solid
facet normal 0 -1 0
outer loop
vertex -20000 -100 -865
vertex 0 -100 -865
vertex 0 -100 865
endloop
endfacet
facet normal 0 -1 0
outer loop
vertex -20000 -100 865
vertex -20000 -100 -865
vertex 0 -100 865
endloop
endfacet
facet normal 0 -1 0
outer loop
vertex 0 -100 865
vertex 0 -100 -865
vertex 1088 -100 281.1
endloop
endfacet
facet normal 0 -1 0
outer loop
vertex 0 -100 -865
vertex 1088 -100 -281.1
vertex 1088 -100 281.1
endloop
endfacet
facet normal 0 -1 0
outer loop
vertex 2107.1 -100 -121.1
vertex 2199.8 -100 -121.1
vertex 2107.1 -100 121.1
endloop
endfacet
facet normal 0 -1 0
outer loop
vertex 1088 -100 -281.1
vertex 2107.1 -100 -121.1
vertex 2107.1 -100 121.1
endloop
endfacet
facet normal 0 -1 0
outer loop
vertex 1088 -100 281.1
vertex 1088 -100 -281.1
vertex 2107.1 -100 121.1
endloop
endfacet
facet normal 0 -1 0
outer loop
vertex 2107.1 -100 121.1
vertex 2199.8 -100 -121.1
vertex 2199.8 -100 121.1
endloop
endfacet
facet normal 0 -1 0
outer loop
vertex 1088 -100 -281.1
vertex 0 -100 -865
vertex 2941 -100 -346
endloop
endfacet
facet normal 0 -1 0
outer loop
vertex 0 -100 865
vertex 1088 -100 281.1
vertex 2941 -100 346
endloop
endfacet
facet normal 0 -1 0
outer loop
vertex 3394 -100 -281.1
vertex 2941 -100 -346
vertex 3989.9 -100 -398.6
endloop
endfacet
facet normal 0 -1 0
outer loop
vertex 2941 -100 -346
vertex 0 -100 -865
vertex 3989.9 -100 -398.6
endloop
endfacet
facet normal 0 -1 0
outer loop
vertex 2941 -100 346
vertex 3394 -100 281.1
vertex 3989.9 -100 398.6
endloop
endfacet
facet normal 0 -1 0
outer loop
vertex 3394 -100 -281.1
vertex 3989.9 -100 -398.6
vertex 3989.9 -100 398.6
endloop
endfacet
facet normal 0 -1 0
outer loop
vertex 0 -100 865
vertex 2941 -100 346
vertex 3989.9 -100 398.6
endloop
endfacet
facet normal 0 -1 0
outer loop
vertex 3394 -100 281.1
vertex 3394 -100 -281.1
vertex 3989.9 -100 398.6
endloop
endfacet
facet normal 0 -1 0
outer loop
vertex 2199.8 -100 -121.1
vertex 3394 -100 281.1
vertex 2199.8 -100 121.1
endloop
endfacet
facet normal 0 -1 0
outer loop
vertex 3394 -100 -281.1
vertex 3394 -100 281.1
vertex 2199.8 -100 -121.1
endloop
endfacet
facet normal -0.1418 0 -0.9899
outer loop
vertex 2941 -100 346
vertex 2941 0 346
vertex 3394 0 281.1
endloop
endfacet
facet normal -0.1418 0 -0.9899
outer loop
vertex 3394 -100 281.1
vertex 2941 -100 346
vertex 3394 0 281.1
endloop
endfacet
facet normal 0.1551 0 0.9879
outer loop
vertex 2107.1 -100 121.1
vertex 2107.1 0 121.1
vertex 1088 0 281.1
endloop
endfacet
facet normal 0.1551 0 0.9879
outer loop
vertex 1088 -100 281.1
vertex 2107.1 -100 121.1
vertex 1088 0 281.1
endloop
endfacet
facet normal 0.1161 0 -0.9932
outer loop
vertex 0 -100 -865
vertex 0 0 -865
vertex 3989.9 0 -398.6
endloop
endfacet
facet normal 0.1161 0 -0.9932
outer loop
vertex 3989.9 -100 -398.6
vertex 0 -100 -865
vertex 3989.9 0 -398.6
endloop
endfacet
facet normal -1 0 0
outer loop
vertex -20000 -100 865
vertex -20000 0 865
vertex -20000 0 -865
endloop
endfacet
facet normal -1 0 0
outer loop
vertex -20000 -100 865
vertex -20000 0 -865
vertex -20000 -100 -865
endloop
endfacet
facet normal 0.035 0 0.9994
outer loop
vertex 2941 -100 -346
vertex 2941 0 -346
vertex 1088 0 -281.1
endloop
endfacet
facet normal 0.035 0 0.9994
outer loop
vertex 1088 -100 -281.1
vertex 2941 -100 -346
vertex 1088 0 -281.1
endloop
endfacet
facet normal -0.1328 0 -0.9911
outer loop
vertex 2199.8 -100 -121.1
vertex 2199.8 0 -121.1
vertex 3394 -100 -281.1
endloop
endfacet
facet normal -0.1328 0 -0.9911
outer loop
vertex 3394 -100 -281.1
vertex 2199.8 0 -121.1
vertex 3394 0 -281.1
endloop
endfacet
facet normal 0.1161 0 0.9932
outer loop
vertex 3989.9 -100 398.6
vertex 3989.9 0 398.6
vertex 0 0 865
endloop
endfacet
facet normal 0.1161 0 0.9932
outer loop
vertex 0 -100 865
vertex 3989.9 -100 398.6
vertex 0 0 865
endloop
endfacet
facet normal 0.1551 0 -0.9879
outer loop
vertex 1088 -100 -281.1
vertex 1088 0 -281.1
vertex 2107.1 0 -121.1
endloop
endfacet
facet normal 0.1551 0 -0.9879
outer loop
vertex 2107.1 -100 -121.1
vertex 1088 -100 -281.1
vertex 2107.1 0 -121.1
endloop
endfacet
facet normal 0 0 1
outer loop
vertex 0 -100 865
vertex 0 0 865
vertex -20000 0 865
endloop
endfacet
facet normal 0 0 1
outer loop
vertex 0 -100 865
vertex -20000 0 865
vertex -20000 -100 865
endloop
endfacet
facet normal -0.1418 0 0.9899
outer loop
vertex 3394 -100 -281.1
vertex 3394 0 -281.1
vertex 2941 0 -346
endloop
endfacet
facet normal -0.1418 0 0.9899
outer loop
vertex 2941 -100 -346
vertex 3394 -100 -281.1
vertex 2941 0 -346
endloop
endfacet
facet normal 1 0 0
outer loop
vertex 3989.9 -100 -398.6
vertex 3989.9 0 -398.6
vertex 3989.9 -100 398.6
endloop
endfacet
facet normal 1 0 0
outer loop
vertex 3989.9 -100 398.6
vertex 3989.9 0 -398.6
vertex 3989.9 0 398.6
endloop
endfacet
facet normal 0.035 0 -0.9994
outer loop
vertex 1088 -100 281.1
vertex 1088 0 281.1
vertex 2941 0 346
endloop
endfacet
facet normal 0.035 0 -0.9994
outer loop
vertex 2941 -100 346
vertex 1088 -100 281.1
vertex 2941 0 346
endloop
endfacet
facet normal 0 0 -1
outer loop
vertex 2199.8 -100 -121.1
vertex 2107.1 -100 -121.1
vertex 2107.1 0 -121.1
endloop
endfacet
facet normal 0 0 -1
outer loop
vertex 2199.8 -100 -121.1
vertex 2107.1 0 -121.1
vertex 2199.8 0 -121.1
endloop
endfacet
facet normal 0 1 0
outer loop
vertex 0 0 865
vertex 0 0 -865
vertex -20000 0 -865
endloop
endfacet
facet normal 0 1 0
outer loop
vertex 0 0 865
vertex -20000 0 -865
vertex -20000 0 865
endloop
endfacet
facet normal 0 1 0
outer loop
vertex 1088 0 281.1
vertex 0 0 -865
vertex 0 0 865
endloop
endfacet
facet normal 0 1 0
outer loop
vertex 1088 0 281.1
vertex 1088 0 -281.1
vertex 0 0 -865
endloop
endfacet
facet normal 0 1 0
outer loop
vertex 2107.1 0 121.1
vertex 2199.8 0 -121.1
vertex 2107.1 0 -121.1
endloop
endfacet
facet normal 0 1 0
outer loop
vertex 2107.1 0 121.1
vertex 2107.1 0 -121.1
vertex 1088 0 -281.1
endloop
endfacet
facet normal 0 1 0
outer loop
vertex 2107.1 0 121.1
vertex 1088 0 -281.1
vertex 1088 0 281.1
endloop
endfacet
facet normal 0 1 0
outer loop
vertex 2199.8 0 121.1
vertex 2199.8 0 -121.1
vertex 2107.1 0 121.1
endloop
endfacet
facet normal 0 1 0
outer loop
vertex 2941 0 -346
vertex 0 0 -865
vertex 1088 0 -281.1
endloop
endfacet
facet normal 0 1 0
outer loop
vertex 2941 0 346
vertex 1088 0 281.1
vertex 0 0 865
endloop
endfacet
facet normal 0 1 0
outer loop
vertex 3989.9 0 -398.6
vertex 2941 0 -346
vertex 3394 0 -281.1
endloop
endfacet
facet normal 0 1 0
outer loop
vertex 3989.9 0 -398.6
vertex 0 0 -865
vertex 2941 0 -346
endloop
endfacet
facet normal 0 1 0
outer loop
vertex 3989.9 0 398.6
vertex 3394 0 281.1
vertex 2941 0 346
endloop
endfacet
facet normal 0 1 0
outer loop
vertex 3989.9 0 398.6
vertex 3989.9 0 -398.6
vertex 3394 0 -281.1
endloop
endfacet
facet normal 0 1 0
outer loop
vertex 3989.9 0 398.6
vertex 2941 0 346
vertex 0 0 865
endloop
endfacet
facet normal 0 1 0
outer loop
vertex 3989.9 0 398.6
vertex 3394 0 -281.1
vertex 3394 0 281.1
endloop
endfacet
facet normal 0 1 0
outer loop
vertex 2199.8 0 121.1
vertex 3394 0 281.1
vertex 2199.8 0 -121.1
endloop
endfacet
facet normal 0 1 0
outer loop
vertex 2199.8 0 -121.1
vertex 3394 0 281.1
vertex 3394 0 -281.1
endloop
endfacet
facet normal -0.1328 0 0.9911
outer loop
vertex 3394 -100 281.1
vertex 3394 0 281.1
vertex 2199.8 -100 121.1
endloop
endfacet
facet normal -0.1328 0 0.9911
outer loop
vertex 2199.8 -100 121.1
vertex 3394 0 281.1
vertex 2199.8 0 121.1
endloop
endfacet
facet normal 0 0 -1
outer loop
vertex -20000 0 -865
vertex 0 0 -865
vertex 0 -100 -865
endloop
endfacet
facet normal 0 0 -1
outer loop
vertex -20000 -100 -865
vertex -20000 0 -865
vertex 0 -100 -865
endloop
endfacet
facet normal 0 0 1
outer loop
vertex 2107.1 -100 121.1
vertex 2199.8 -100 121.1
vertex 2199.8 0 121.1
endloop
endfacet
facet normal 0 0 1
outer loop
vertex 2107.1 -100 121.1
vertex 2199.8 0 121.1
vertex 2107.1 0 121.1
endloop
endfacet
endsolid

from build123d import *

# Parameters (mm, degrees)
F1_DEPTH  = 100
F1_FACE_W = 100
F1_FACE_H = 1730
F2_DEPTH  = 20000


with BuildPart() as f1:
    # F0 (on Front) → F1 (new body)
    with BuildSketch(Plane.XZ):
        Polygon((3989.9, 0), (3989.9, 398.6), (0, 865), (0, 0), (0, -865), (3989.9, -398.6), align=None)
        Polygon((3394, -281.1), (2941, -346), (1088, -281.1), (2107.1, -121.1), (2199.8, -121.1), align=None, mode=Mode.SUBTRACT)
        Polygon((2107.1, 121.1), (1088, 281.1), (2941, 346), (3394, 281.1), (2199.8, 121.1), align=None, mode=Mode.SUBTRACT)
    extrude(amount=F1_DEPTH)

    # F1_face (on face) → F2 (join)
    with BuildSketch(Plane(origin=(0, -50, 0), x_dir=(0, -1, 0), z_dir=(-1, 0, 0))):
        Rectangle(F1_FACE_W, F1_FACE_H)
    extrude(amount=F2_DEPTH)


solid = f1.part
